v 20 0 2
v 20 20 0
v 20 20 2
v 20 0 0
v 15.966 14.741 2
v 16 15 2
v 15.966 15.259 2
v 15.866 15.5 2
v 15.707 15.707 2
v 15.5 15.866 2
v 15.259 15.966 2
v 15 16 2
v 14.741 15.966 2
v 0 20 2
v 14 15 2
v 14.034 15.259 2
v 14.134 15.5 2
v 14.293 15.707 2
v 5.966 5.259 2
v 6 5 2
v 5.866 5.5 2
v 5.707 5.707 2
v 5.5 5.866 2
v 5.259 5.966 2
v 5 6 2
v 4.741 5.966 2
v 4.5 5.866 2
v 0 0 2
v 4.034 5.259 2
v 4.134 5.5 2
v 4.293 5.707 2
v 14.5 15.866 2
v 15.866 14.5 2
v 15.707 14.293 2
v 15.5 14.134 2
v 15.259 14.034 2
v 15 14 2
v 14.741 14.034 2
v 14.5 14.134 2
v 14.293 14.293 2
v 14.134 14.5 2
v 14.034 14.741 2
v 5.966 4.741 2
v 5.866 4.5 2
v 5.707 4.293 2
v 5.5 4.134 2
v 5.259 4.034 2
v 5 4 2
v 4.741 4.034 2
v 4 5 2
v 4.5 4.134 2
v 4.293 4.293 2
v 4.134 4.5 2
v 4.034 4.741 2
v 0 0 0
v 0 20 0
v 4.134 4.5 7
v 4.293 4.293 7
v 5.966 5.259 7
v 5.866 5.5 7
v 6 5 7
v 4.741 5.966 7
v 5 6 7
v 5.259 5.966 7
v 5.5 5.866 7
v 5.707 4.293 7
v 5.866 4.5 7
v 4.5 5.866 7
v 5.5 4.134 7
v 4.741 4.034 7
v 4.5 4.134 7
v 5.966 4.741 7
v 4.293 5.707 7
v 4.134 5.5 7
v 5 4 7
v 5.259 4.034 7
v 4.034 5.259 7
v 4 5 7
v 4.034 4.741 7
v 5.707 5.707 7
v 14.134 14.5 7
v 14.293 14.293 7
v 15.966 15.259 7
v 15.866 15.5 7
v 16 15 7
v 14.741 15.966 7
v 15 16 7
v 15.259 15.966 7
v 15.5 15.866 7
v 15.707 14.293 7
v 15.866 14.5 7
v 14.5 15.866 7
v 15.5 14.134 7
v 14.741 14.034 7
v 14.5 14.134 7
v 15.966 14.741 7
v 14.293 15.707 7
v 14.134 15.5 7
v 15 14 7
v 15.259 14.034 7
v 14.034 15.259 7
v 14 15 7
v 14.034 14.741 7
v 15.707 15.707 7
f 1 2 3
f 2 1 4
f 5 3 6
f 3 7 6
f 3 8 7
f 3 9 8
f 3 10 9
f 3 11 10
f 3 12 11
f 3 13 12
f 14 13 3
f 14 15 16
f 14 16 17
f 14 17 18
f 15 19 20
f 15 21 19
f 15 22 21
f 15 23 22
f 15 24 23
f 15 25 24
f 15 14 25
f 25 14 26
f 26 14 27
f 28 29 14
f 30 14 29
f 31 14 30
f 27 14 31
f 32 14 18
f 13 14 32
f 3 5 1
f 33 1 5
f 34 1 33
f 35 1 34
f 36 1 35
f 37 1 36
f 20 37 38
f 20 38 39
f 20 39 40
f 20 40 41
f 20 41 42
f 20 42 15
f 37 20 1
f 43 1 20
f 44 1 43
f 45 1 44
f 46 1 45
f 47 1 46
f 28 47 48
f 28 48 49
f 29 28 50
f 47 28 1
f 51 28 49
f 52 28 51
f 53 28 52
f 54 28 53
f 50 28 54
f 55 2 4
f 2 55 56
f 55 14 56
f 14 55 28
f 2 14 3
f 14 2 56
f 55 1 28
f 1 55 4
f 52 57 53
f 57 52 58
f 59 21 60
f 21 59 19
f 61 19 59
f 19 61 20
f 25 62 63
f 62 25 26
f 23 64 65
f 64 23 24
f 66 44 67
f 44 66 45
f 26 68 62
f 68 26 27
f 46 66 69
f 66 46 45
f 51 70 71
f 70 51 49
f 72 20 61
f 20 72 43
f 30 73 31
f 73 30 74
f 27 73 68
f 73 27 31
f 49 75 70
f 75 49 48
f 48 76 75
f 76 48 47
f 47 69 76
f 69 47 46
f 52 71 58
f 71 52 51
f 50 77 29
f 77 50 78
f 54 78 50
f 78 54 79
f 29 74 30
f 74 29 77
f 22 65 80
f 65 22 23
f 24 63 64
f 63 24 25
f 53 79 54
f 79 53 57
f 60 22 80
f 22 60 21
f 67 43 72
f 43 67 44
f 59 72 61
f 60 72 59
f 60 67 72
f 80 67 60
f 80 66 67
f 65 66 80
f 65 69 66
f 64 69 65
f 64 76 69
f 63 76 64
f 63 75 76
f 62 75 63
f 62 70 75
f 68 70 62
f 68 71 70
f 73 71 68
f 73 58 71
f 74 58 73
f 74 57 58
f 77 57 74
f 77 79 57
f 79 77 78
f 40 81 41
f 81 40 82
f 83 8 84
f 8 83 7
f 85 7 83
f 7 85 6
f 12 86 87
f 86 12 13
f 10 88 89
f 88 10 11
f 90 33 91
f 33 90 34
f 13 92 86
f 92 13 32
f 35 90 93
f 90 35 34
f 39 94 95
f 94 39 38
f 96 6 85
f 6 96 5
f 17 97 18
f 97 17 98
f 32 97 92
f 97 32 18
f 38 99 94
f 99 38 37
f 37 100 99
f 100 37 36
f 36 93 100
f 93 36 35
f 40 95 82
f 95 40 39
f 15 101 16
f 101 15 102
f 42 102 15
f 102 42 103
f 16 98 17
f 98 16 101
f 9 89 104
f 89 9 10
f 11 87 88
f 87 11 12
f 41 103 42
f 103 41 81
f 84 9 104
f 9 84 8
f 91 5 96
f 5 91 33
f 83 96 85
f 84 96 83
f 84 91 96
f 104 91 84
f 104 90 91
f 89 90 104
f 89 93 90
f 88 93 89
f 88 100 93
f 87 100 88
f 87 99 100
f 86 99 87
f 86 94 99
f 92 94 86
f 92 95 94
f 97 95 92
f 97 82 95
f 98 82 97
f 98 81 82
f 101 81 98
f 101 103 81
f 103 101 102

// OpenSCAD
// Generated by scadwright. Do not hand-edit —
// edit the Python source and regenerate.

$fn = 24;

// _Plate
union() {
    cube([20, 20, 2], center=false);

    translate([5, 5, 2]) {
        // _Peg
        cylinder(h=5, r=1, center=false);
    }

    translate([15, 15, 2]) {
        // _Peg
        cylinder(h=5, r=1, center=false);
    }
}
